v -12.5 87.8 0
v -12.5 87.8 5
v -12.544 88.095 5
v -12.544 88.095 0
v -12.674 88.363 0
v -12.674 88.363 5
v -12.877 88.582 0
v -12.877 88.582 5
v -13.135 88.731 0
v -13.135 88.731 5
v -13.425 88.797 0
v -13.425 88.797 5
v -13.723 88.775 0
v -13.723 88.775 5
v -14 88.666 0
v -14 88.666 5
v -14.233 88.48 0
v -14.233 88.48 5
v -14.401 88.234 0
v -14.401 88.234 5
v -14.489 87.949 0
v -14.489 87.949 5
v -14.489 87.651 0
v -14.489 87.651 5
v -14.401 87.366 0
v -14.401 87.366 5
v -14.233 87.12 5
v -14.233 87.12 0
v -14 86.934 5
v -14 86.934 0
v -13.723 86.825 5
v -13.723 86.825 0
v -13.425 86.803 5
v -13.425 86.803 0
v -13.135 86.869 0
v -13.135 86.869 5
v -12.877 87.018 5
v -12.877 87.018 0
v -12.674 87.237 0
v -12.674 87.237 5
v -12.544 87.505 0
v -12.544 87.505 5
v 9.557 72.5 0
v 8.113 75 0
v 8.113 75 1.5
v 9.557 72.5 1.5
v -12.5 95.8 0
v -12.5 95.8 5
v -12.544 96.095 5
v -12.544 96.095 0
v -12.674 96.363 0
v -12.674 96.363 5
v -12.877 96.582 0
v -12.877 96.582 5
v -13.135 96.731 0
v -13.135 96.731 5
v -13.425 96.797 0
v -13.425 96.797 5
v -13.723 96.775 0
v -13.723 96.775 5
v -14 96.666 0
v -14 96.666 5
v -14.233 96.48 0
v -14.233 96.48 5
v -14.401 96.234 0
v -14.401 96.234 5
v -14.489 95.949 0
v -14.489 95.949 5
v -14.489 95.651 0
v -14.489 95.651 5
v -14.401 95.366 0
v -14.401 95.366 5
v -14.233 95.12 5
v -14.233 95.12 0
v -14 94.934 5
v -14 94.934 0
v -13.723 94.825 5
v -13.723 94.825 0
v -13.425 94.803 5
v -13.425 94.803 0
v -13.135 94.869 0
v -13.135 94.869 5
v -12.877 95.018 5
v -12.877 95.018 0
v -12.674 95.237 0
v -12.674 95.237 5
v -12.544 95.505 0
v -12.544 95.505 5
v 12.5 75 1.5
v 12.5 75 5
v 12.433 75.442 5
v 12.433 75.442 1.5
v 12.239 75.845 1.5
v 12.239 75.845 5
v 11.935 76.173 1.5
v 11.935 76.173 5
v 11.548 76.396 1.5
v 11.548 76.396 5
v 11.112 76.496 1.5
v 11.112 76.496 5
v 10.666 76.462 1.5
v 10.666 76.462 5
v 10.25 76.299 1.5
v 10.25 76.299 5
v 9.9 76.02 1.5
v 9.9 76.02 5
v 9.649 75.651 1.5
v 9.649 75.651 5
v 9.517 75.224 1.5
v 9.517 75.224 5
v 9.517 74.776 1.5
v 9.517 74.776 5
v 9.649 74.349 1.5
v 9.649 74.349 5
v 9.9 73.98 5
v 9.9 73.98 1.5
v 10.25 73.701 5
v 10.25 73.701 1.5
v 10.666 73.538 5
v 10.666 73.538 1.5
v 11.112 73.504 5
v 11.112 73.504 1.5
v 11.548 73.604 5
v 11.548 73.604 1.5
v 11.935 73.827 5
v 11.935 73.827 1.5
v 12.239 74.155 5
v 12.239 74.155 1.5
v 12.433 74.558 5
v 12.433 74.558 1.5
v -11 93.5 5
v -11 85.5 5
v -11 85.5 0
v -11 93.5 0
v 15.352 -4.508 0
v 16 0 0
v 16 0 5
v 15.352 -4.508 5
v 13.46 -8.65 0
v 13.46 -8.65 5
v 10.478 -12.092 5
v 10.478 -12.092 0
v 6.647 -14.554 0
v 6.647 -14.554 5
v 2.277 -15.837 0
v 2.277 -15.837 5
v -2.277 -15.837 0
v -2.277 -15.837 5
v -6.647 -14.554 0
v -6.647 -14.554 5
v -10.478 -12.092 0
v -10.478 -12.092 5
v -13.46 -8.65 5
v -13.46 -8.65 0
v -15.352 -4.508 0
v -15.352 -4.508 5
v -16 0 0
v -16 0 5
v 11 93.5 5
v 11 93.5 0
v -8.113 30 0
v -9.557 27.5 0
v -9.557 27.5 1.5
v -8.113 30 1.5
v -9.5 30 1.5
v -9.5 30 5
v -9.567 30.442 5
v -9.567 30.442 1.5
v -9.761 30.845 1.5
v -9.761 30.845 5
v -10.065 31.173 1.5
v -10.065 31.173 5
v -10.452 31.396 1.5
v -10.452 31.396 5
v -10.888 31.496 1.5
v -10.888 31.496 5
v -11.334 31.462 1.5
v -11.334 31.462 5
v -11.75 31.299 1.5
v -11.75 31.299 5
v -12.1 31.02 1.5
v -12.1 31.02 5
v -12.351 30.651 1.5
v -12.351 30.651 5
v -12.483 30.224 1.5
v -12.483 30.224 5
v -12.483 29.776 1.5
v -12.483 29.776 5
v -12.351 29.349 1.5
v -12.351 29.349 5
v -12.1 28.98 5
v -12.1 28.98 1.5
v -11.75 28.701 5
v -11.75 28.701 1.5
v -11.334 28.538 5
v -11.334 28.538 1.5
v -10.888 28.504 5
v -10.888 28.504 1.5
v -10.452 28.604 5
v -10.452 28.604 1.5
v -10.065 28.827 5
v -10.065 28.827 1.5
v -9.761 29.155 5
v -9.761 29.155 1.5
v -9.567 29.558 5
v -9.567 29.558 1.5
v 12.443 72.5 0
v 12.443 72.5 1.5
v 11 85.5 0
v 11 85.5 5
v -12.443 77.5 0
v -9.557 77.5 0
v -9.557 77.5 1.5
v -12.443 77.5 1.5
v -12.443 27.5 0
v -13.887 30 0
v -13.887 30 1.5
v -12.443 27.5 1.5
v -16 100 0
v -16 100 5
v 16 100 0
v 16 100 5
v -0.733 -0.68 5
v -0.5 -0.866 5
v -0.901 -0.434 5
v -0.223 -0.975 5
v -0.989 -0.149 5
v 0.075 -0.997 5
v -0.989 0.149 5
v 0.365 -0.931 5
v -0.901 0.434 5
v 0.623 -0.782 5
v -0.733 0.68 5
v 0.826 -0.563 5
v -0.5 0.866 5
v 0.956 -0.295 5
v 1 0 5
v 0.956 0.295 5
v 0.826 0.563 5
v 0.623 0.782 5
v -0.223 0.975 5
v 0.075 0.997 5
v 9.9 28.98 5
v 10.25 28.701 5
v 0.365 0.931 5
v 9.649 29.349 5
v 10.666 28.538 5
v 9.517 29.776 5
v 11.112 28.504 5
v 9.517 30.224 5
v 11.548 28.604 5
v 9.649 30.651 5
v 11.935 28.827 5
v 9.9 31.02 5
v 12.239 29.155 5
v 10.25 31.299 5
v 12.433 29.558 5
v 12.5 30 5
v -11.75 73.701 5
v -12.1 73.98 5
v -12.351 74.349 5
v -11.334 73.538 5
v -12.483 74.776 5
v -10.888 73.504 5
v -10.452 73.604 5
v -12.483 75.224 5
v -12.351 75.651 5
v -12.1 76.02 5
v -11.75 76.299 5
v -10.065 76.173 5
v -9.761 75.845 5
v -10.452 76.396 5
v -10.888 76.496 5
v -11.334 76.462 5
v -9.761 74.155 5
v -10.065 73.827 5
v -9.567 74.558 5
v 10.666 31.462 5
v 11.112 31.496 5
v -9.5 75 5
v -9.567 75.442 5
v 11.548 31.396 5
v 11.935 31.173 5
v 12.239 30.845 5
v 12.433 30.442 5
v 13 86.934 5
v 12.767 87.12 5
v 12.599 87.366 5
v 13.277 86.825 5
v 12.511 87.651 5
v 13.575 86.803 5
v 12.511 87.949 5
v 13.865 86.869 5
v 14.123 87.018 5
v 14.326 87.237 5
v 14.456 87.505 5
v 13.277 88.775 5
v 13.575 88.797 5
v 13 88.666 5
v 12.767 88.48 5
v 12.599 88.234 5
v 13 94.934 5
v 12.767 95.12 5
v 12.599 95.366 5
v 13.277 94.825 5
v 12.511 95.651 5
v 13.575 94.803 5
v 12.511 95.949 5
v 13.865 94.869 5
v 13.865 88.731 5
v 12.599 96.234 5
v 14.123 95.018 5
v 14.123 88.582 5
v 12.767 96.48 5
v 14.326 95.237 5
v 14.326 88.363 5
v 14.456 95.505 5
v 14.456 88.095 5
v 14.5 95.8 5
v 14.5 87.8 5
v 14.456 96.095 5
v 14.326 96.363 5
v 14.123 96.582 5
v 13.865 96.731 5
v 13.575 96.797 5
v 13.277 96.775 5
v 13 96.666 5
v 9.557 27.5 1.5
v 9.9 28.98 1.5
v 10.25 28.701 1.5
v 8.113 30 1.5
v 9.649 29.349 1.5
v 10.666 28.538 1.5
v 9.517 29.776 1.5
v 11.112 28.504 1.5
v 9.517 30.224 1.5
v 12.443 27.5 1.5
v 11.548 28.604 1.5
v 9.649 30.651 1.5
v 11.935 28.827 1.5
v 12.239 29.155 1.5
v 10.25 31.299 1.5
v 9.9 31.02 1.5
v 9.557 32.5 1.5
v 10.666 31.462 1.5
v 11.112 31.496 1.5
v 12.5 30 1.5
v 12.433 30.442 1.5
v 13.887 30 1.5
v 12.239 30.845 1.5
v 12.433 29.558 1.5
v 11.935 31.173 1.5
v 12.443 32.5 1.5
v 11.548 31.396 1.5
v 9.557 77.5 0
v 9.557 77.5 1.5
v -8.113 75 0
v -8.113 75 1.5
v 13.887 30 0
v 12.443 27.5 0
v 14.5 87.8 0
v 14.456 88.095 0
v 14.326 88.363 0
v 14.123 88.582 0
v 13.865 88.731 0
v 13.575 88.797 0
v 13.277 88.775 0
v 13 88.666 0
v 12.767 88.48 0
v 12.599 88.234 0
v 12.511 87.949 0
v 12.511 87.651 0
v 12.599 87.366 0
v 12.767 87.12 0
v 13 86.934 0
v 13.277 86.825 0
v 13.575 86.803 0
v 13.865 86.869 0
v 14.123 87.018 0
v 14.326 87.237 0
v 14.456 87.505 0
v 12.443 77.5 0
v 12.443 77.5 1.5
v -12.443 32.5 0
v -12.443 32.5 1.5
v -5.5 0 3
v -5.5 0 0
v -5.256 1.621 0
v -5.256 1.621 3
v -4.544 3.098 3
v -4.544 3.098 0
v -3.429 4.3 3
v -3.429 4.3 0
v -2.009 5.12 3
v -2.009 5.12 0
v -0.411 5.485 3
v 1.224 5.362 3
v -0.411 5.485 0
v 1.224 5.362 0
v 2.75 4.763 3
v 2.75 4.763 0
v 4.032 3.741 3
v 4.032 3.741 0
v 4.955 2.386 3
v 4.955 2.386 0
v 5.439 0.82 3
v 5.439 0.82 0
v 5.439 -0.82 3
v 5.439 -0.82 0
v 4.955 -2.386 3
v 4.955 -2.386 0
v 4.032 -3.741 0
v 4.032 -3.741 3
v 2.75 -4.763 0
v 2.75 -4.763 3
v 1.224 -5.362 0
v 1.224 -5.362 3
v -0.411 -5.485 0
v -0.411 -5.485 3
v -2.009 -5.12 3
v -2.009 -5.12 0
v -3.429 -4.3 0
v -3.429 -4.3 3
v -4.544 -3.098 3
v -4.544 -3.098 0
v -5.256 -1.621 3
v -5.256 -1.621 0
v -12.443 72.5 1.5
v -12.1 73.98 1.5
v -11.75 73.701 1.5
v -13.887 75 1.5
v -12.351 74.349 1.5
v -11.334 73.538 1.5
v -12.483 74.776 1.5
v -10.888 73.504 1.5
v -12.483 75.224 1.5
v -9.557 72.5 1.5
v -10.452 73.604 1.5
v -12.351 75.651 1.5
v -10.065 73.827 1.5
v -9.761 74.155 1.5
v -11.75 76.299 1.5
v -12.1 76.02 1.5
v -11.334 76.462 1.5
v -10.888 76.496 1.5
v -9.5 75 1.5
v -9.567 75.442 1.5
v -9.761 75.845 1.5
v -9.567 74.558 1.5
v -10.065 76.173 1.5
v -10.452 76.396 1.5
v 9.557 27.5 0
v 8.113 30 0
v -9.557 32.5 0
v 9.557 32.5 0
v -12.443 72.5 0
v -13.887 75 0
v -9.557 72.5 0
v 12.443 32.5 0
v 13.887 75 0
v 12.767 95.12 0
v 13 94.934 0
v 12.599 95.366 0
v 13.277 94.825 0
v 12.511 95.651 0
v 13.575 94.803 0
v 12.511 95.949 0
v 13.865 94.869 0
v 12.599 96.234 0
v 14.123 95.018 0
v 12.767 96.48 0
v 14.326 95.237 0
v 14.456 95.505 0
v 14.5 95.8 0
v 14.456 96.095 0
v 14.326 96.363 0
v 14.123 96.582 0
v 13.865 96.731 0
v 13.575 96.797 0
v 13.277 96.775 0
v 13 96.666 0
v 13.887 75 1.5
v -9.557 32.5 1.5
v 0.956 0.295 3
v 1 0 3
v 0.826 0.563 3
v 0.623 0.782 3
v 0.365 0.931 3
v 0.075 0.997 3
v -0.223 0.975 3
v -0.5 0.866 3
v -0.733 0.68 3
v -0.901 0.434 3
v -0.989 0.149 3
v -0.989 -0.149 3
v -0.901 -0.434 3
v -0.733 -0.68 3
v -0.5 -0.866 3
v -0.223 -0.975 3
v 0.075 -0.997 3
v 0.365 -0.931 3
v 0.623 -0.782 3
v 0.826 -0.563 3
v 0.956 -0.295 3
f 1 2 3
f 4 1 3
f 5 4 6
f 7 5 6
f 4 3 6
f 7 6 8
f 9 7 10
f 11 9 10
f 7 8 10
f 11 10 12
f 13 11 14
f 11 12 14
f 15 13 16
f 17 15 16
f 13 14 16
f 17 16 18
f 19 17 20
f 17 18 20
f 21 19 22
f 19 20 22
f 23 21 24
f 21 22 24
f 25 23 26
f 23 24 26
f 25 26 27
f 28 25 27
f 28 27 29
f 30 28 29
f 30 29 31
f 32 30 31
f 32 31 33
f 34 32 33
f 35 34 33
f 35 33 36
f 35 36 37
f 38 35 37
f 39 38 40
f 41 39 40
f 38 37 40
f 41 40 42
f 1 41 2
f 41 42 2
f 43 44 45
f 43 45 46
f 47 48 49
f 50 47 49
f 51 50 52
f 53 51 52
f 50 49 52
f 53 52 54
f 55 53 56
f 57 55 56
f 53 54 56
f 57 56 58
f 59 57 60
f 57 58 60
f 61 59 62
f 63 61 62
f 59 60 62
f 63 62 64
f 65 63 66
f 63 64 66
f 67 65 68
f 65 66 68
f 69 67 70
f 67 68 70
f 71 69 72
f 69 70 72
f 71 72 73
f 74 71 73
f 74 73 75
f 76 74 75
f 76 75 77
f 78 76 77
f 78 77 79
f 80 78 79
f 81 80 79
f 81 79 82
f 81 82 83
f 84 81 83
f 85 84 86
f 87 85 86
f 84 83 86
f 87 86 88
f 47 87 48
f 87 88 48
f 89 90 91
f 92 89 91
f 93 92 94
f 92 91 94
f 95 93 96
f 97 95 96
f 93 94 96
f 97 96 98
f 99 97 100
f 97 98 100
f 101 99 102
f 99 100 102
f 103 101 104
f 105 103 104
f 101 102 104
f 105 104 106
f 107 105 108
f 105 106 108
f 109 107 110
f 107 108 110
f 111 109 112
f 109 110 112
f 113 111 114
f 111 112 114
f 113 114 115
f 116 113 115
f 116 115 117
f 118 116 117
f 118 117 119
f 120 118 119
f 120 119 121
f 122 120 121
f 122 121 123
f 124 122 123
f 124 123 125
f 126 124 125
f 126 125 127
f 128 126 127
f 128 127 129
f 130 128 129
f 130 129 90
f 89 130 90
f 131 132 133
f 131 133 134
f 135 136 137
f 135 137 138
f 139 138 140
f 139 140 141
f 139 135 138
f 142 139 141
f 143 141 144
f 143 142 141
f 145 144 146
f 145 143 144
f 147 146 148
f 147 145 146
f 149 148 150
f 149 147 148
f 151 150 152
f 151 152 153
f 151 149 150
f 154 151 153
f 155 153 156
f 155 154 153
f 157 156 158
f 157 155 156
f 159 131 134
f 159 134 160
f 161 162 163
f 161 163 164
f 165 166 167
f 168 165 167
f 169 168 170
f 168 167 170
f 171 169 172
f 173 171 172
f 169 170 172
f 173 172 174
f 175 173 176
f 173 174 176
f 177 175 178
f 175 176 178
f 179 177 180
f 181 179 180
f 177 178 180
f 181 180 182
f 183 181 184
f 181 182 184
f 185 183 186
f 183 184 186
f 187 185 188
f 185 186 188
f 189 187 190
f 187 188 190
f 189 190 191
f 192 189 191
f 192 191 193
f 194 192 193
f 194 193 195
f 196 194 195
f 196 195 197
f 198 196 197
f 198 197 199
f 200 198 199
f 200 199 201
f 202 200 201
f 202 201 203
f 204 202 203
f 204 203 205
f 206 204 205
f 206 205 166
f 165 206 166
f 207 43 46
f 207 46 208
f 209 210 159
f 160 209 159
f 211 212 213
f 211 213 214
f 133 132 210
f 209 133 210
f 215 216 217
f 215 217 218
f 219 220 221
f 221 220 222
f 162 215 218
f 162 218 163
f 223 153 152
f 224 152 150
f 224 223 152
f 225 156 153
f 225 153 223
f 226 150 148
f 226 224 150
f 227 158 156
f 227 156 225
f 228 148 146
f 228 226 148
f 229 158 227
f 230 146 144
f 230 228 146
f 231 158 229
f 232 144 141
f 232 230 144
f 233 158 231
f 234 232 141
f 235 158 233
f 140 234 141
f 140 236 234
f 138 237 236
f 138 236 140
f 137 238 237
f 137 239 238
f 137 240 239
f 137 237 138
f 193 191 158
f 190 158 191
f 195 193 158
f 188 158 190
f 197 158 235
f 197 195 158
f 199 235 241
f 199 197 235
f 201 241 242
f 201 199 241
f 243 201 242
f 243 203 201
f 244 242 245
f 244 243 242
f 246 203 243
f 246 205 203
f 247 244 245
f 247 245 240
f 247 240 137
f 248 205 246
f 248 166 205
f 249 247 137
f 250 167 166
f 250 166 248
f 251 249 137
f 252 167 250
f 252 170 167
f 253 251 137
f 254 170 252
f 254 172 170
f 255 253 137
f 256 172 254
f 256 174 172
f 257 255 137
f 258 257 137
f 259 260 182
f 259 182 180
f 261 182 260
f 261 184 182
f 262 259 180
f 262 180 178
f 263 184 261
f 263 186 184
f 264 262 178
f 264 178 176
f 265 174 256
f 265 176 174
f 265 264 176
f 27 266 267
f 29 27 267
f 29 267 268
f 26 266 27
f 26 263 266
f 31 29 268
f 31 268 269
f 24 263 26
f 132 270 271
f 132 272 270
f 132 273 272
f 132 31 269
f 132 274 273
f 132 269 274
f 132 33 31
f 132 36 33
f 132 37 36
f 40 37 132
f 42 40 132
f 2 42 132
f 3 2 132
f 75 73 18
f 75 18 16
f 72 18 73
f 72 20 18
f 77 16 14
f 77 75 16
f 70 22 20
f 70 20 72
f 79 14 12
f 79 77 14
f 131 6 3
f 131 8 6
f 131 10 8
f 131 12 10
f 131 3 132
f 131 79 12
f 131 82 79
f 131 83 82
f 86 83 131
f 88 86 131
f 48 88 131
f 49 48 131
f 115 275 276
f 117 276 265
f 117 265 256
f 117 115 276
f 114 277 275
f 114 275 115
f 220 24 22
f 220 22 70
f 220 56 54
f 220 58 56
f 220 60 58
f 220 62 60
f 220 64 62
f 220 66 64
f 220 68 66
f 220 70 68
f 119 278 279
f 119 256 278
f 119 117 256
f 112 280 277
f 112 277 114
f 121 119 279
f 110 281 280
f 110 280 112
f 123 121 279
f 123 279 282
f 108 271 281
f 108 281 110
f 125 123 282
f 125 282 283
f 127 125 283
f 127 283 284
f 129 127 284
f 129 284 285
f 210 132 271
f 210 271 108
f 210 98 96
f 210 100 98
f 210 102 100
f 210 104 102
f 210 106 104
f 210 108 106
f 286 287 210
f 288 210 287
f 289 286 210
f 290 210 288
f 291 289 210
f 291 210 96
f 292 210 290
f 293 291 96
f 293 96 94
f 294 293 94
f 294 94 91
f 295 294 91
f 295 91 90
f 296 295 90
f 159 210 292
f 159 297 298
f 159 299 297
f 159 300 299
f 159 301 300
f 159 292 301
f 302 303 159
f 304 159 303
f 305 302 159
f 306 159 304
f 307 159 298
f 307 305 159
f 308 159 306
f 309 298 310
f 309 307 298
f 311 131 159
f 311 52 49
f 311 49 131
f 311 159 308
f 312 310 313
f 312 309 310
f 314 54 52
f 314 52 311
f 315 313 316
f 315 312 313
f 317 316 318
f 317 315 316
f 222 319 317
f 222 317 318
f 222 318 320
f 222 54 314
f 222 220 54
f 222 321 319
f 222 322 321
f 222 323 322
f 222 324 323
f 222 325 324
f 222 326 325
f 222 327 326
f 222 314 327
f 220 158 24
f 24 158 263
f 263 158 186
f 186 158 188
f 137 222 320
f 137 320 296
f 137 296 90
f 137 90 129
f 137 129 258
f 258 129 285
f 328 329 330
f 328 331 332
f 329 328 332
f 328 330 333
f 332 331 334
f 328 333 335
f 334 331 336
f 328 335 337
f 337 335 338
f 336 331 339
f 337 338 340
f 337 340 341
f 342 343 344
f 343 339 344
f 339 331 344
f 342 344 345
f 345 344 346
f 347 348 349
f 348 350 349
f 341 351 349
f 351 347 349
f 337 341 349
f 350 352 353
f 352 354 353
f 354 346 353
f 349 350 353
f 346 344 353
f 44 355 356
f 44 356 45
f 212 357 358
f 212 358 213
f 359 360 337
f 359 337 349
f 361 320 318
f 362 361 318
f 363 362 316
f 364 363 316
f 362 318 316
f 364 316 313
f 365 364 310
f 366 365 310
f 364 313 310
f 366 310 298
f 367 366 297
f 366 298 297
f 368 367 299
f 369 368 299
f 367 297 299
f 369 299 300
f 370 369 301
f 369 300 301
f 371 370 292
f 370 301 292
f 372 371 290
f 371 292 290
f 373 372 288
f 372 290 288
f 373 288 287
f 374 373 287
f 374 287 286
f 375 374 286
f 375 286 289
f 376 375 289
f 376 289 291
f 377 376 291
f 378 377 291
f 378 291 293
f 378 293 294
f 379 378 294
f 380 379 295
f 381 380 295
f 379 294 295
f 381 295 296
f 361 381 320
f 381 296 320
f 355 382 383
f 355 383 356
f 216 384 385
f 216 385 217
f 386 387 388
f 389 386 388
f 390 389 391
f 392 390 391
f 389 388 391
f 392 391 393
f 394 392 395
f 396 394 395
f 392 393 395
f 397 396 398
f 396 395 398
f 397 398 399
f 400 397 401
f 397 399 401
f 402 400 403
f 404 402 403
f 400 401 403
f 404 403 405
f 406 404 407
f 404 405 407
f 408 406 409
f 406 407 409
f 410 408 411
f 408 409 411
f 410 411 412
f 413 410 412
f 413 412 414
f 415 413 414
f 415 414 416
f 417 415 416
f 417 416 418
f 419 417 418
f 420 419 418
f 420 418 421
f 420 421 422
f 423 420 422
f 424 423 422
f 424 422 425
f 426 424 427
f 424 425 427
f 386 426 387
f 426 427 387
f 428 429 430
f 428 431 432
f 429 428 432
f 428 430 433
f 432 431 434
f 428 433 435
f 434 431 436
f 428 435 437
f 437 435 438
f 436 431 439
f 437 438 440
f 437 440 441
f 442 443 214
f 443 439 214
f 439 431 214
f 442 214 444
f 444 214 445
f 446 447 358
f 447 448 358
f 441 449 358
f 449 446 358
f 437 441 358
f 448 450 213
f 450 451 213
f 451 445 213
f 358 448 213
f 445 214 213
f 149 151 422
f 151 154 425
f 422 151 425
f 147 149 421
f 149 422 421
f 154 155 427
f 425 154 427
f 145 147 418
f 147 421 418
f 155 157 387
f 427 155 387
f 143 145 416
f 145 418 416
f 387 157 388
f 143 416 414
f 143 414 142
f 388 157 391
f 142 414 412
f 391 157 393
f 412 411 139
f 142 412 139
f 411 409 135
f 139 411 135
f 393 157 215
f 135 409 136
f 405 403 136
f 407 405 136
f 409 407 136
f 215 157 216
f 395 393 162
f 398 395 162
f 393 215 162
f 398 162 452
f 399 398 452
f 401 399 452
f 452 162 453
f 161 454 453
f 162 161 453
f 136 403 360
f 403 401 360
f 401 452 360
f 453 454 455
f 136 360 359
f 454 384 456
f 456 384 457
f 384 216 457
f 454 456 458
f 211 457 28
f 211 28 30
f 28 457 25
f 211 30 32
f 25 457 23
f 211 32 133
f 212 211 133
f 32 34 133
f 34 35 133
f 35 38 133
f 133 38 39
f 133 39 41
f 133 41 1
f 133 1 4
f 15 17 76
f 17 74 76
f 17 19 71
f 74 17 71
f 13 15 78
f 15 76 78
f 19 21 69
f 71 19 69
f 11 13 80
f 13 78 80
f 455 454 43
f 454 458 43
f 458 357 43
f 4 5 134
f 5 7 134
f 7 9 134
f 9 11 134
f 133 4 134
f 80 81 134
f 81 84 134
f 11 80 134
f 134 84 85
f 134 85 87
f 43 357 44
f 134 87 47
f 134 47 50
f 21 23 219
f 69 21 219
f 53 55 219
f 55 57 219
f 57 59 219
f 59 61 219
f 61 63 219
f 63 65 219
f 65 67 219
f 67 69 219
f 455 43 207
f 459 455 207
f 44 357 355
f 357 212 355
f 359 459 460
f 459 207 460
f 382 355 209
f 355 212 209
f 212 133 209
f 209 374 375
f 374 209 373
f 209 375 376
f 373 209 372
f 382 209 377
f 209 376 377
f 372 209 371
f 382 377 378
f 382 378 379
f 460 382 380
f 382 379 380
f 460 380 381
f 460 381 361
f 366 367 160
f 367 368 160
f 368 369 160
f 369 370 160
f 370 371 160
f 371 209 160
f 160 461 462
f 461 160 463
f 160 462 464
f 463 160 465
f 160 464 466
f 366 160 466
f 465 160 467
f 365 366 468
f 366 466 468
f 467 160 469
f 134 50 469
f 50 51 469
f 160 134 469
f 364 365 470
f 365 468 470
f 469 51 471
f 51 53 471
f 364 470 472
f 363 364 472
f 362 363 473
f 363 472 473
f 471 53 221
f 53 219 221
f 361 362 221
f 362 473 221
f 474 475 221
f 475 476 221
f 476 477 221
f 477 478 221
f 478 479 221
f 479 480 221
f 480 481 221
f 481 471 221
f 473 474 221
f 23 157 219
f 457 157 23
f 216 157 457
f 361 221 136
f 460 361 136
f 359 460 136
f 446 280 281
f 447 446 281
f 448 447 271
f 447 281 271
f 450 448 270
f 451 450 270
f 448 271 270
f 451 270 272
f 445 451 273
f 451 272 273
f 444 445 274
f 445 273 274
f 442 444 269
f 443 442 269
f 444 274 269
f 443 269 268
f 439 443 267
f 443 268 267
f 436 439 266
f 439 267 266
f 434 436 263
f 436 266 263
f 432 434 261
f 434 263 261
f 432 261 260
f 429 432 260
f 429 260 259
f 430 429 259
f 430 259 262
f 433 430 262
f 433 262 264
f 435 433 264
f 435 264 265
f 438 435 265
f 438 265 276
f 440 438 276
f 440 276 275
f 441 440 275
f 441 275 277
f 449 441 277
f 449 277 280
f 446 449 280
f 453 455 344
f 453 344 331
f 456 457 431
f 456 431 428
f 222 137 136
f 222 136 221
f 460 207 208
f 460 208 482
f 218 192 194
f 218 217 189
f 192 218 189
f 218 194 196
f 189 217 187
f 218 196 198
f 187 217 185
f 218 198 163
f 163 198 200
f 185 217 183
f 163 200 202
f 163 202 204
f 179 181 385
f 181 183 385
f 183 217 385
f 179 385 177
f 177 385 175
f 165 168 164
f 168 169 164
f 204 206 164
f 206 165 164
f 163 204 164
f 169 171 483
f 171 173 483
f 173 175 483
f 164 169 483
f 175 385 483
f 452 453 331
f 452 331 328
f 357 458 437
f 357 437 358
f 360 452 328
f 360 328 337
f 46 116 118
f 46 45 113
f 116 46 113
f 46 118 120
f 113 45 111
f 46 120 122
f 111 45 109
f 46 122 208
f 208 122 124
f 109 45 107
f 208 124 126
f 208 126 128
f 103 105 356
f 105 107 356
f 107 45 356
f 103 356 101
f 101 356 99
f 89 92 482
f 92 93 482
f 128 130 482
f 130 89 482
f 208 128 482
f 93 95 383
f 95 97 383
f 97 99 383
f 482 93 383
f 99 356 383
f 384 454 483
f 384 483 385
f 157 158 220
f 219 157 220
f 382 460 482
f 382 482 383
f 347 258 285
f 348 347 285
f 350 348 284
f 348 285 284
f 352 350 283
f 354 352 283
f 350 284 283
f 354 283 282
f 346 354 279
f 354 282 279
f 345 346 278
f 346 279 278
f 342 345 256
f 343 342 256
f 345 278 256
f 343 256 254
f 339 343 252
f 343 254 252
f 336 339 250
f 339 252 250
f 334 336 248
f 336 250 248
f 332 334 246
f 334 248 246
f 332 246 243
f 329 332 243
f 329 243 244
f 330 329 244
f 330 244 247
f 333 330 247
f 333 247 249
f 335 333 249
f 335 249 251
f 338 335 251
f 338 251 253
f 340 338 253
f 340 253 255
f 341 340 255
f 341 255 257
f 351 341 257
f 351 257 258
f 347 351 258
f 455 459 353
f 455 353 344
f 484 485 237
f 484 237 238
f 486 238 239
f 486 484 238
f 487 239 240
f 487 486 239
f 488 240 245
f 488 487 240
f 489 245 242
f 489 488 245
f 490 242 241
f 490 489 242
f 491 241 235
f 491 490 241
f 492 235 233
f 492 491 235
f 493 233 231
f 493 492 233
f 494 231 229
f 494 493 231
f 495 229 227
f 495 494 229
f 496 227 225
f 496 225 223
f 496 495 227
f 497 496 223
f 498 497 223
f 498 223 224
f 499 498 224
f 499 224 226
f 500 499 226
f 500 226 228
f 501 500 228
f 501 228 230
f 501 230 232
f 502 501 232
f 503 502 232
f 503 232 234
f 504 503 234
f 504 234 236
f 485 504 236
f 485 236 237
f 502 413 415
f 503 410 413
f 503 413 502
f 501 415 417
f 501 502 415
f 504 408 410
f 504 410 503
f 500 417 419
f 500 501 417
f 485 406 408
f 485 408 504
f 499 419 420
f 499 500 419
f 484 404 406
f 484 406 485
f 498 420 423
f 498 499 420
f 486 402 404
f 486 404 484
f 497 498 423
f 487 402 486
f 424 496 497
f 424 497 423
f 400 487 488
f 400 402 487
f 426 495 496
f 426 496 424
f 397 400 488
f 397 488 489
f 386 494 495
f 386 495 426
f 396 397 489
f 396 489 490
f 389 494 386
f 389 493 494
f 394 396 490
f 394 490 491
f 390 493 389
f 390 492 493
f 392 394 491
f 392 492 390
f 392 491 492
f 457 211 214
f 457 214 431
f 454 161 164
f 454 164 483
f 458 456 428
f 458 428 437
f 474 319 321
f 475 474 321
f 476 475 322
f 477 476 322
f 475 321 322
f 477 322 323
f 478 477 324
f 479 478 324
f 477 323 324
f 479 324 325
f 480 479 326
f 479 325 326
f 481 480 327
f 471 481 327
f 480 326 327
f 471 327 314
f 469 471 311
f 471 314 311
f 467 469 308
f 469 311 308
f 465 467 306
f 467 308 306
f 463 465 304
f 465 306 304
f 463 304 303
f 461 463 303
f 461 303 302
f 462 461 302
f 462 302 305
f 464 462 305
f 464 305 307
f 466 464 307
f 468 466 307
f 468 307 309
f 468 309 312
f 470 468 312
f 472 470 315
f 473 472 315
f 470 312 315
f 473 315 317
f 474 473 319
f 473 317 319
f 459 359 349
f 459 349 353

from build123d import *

# Parameters (mm, degrees)
SKETCH1_R           = 1
BOSS_EXTRUDE1_DEPTH = 5
SKETCH2_R           = 5.5
CUT_EXTRUDE1_DEPTH  = 3
SKETCH3_R           = 1.5
CUT_EXTRUDE2_DEPTH  = 82.737384348
SKETCH4_W           = 32
SKETCH4_H           = 20
SKETCH4_R           = 1
SKETCH4_W_2         = 22
SKETCH4_H_2         = 8
BOSS_EXTRUDE2_DEPTH = 5
CUT_EXTRUDE3_DEPTH  = 1.5


with BuildPart() as part:
    # Sketch1 → Boss-Extrude1 (new body)
    with BuildSketch(Plane.XY):
        with BuildLine():
            Line((-16, 0), (-16, 80))
            Line((-16, 80), (16, 80))
            Line((16, 80), (16, 0))
            ThreePointArc((16, 0), (0, -16), (-16, 0))
        make_face()
        Circle(SKETCH1_R, mode=Mode.SUBTRACT)
    extrude(amount=BOSS_EXTRUDE1_DEPTH)

    # Sketch2 → Cut-Extrude1 (cut)
    with BuildSketch(Plane(origin=(0, 0, 0), x_dir=(-1, 0, 0), z_dir=(0, 0, -1))):
        Circle(SKETCH2_R)
    extrude(amount=-CUT_EXTRUDE1_DEPTH, mode=Mode.SUBTRACT)

    # Sketch3 → Cut-Extrude2 (cut, through all)
    with BuildSketch(Plane.XY.offset(5)):
        with Locations((-11, 75)):
            Circle(SKETCH3_R)
        with Locations((11, 75)):
            Circle(SKETCH3_R)
        with Locations((-11, 30)):
            Circle(SKETCH3_R)
        with Locations((11, 30)):
            Circle(SKETCH3_R)
    extrude(amount=-CUT_EXTRUDE2_DEPTH, mode=Mode.SUBTRACT)

    # Sketch4 → Boss-Extrude2 (add)
    with BuildSketch(Plane.XY.offset(5)):
        with Locations((0, 90)):
            Rectangle(SKETCH4_W, SKETCH4_H)
        with Locations((-13.5, 95.8)):
            Circle(SKETCH4_R, mode=Mode.SUBTRACT)
        with Locations((13.5, 95.8)):
            Circle(SKETCH4_R, mode=Mode.SUBTRACT)
        with Locations((-13.5, 87.8)):
            Circle(SKETCH4_R, mode=Mode.SUBTRACT)
        with Locations((13.5, 87.8)):
            Circle(SKETCH4_R, mode=Mode.SUBTRACT)
        with Locations((0, 89.5)):
            Rectangle(SKETCH4_W_2, SKETCH4_H_2, mode=Mode.SUBTRACT)
    extrude(amount=-BOSS_EXTRUDE2_DEPTH)

    # Sketch5 → Cut-Extrude3 (cut)
    with BuildSketch(Plane.XY):
        Polygon((-8.113248654, 75), (-9.556624327, 77.5), (-12.443375673, 77.5), (-13.886751346, 75), (-12.443375673, 72.5), (-9.556624327, 72.5), align=None)
        Polygon((8.113248654, 75), (9.556624327, 72.5), (12.443375673, 72.5), (13.886751346, 75), (12.443375673, 77.5), (9.556624327, 77.5), align=None)
        Polygon((8.113248654, 30), (9.556624327, 27.5), (12.443375673, 27.5), (13.886751346, 30), (12.443375673, 32.5), (9.556624327, 32.5), align=None)
        Polygon((-8.113248654, 30), (-9.556624327, 32.5), (-12.443375673, 32.5), (-13.886751346, 30), (-12.443375673, 27.5), (-9.556624327, 27.5), align=None)
    extrude(amount=CUT_EXTRUDE3_DEPTH, mode=Mode.SUBTRACT)


solid = part.part
